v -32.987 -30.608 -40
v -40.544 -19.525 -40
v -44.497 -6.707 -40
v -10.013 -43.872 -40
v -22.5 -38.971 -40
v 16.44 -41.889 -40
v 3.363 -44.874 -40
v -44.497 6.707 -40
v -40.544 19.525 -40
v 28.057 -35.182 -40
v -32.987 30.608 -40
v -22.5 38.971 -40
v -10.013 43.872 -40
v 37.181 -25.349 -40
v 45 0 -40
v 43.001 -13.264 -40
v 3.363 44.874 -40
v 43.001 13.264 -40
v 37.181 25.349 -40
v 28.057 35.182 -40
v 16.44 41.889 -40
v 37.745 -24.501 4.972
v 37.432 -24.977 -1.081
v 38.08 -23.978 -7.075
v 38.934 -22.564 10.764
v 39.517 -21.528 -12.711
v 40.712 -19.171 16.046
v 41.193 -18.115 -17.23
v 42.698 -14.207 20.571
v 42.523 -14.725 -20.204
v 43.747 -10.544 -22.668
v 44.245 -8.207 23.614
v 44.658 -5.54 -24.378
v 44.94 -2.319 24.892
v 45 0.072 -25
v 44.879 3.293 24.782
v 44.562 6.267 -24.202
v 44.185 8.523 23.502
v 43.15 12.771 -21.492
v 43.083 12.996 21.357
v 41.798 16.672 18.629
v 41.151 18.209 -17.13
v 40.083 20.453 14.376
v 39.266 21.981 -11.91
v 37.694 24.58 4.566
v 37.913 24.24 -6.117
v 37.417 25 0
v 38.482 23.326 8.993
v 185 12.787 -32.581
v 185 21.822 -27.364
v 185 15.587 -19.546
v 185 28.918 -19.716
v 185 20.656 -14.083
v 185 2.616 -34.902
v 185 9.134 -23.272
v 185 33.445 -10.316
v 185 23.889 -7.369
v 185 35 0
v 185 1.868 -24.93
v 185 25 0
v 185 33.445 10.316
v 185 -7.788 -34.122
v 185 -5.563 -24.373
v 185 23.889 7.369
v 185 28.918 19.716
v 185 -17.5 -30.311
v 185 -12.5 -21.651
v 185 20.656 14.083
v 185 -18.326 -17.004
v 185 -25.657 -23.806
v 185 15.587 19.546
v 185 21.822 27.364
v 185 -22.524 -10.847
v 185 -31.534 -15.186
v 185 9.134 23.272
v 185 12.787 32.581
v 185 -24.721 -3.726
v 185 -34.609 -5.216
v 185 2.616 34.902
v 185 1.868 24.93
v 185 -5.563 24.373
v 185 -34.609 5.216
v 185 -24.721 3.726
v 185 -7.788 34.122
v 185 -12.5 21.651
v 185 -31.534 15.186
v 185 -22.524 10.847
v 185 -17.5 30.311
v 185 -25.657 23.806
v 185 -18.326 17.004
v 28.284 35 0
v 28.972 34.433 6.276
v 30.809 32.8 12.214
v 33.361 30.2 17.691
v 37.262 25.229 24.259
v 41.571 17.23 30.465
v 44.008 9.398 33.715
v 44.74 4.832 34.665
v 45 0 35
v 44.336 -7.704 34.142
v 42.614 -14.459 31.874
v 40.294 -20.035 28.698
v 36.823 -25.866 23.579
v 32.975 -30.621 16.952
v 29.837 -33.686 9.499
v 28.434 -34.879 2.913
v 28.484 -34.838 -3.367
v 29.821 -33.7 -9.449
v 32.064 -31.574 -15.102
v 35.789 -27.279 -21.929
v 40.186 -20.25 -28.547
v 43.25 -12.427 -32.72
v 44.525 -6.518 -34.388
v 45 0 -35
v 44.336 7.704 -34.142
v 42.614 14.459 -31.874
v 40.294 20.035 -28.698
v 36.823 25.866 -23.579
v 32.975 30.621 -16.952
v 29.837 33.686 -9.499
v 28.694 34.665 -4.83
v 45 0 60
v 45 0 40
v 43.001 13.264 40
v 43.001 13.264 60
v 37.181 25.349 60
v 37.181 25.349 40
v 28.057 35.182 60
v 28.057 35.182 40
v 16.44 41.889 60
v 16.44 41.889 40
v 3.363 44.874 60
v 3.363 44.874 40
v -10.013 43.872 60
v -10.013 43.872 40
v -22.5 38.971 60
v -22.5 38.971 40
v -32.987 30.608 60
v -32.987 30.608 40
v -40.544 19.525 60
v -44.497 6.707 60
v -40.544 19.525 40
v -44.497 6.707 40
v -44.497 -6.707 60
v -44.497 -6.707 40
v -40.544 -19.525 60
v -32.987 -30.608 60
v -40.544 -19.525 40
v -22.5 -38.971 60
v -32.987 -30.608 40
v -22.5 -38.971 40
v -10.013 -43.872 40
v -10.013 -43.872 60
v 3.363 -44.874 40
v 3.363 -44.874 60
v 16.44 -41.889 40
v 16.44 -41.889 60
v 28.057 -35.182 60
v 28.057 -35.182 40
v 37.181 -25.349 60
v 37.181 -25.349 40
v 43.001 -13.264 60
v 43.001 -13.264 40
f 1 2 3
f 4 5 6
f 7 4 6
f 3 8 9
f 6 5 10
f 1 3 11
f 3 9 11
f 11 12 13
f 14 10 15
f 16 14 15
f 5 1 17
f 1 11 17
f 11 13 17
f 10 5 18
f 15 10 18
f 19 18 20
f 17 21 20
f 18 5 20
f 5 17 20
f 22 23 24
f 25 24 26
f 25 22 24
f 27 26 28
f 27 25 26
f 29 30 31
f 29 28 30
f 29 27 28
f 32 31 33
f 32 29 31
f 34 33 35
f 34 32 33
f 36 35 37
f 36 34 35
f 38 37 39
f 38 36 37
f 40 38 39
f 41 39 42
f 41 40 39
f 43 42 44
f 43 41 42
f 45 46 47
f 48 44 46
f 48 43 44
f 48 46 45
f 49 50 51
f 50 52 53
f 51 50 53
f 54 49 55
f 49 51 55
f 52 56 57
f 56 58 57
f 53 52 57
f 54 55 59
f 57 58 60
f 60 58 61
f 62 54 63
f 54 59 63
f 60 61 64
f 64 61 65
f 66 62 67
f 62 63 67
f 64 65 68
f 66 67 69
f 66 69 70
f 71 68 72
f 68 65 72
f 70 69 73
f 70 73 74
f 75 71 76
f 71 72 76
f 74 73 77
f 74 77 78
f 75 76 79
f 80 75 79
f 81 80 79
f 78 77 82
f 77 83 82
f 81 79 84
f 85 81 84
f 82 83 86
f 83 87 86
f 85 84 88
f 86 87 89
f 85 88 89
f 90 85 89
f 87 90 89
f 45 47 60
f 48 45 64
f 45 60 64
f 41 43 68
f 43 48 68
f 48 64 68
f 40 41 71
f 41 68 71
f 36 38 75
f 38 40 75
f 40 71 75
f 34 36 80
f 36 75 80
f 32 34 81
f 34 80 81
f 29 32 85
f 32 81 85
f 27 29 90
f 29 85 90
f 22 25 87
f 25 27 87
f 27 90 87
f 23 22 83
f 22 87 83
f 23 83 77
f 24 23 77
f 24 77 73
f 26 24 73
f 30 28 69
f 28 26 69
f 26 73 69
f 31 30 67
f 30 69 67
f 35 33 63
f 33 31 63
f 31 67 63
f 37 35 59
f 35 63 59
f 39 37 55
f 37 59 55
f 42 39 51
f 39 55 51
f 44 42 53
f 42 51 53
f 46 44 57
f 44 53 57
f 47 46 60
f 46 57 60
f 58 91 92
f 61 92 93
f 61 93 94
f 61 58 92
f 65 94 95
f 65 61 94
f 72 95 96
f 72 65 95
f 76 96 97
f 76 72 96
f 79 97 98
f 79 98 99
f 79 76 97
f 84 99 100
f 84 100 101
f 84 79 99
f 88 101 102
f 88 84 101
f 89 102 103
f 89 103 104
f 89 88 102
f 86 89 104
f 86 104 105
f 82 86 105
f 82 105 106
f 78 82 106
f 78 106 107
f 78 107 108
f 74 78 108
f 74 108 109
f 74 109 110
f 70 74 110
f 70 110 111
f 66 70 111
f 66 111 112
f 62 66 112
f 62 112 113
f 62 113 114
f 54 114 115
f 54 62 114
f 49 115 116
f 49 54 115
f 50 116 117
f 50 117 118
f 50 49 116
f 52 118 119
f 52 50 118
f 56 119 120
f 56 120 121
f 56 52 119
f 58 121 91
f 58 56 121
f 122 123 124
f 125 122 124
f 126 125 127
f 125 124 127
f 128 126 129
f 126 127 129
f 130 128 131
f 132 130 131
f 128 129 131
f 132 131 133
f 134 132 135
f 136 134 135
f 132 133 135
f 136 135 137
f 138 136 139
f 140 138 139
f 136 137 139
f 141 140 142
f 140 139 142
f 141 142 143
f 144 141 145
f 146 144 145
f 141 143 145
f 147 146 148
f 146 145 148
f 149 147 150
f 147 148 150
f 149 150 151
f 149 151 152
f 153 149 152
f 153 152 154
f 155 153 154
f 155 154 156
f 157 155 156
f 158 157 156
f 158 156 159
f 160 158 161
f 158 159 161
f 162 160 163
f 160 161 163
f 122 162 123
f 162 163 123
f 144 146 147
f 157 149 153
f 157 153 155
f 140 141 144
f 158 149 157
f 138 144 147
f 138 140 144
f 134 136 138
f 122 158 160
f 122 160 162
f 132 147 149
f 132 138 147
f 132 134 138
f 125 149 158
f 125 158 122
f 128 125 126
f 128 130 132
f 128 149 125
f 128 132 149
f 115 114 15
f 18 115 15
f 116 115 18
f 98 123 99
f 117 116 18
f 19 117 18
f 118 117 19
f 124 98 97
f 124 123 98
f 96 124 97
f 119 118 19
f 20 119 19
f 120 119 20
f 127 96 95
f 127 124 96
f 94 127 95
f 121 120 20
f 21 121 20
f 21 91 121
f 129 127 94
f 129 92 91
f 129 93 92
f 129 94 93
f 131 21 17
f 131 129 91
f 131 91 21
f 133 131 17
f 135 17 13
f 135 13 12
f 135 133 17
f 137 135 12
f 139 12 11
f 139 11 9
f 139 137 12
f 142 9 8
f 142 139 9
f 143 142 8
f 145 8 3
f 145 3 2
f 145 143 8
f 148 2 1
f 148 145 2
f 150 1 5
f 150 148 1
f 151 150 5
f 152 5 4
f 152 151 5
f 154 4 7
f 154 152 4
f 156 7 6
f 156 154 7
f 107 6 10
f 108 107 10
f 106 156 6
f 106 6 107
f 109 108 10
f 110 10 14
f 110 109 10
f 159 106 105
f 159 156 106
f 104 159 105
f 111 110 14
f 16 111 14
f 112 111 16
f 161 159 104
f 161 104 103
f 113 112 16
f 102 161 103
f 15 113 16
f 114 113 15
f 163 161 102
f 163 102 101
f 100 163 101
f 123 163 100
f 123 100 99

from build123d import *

# Parameters (mm, degrees)
SKETCH_W     = 185
SKETCH_H     = 10
SKETCH001_R  = 45
PAD_DEPTH    = 40
SKETCH002_R  = 45
PAD001_DEPTH = 20


with BuildPart() as part:
    # Sketch → Revolution (revolve)
    with BuildSketch(Plane.XY):
        with Locations((92.5, 30)):
            Rectangle(SKETCH_W, SKETCH_H)
    revolve(axis=Axis((0, 0, 0), (1, 0, 0)))

    # Sketch001 → Pad (new body, symmetric)
    with BuildSketch(Plane.XY):
        Circle(SKETCH001_R)
    extrude(amount=PAD_DEPTH, both=True)

    # Sketch002 (on Face5 of Pad) → Pad001 (join)
    with BuildSketch(Plane.XY.offset(40)):
        Circle(SKETCH002_R)
    extrude(amount=PAD001_DEPTH)


solid = part.part
